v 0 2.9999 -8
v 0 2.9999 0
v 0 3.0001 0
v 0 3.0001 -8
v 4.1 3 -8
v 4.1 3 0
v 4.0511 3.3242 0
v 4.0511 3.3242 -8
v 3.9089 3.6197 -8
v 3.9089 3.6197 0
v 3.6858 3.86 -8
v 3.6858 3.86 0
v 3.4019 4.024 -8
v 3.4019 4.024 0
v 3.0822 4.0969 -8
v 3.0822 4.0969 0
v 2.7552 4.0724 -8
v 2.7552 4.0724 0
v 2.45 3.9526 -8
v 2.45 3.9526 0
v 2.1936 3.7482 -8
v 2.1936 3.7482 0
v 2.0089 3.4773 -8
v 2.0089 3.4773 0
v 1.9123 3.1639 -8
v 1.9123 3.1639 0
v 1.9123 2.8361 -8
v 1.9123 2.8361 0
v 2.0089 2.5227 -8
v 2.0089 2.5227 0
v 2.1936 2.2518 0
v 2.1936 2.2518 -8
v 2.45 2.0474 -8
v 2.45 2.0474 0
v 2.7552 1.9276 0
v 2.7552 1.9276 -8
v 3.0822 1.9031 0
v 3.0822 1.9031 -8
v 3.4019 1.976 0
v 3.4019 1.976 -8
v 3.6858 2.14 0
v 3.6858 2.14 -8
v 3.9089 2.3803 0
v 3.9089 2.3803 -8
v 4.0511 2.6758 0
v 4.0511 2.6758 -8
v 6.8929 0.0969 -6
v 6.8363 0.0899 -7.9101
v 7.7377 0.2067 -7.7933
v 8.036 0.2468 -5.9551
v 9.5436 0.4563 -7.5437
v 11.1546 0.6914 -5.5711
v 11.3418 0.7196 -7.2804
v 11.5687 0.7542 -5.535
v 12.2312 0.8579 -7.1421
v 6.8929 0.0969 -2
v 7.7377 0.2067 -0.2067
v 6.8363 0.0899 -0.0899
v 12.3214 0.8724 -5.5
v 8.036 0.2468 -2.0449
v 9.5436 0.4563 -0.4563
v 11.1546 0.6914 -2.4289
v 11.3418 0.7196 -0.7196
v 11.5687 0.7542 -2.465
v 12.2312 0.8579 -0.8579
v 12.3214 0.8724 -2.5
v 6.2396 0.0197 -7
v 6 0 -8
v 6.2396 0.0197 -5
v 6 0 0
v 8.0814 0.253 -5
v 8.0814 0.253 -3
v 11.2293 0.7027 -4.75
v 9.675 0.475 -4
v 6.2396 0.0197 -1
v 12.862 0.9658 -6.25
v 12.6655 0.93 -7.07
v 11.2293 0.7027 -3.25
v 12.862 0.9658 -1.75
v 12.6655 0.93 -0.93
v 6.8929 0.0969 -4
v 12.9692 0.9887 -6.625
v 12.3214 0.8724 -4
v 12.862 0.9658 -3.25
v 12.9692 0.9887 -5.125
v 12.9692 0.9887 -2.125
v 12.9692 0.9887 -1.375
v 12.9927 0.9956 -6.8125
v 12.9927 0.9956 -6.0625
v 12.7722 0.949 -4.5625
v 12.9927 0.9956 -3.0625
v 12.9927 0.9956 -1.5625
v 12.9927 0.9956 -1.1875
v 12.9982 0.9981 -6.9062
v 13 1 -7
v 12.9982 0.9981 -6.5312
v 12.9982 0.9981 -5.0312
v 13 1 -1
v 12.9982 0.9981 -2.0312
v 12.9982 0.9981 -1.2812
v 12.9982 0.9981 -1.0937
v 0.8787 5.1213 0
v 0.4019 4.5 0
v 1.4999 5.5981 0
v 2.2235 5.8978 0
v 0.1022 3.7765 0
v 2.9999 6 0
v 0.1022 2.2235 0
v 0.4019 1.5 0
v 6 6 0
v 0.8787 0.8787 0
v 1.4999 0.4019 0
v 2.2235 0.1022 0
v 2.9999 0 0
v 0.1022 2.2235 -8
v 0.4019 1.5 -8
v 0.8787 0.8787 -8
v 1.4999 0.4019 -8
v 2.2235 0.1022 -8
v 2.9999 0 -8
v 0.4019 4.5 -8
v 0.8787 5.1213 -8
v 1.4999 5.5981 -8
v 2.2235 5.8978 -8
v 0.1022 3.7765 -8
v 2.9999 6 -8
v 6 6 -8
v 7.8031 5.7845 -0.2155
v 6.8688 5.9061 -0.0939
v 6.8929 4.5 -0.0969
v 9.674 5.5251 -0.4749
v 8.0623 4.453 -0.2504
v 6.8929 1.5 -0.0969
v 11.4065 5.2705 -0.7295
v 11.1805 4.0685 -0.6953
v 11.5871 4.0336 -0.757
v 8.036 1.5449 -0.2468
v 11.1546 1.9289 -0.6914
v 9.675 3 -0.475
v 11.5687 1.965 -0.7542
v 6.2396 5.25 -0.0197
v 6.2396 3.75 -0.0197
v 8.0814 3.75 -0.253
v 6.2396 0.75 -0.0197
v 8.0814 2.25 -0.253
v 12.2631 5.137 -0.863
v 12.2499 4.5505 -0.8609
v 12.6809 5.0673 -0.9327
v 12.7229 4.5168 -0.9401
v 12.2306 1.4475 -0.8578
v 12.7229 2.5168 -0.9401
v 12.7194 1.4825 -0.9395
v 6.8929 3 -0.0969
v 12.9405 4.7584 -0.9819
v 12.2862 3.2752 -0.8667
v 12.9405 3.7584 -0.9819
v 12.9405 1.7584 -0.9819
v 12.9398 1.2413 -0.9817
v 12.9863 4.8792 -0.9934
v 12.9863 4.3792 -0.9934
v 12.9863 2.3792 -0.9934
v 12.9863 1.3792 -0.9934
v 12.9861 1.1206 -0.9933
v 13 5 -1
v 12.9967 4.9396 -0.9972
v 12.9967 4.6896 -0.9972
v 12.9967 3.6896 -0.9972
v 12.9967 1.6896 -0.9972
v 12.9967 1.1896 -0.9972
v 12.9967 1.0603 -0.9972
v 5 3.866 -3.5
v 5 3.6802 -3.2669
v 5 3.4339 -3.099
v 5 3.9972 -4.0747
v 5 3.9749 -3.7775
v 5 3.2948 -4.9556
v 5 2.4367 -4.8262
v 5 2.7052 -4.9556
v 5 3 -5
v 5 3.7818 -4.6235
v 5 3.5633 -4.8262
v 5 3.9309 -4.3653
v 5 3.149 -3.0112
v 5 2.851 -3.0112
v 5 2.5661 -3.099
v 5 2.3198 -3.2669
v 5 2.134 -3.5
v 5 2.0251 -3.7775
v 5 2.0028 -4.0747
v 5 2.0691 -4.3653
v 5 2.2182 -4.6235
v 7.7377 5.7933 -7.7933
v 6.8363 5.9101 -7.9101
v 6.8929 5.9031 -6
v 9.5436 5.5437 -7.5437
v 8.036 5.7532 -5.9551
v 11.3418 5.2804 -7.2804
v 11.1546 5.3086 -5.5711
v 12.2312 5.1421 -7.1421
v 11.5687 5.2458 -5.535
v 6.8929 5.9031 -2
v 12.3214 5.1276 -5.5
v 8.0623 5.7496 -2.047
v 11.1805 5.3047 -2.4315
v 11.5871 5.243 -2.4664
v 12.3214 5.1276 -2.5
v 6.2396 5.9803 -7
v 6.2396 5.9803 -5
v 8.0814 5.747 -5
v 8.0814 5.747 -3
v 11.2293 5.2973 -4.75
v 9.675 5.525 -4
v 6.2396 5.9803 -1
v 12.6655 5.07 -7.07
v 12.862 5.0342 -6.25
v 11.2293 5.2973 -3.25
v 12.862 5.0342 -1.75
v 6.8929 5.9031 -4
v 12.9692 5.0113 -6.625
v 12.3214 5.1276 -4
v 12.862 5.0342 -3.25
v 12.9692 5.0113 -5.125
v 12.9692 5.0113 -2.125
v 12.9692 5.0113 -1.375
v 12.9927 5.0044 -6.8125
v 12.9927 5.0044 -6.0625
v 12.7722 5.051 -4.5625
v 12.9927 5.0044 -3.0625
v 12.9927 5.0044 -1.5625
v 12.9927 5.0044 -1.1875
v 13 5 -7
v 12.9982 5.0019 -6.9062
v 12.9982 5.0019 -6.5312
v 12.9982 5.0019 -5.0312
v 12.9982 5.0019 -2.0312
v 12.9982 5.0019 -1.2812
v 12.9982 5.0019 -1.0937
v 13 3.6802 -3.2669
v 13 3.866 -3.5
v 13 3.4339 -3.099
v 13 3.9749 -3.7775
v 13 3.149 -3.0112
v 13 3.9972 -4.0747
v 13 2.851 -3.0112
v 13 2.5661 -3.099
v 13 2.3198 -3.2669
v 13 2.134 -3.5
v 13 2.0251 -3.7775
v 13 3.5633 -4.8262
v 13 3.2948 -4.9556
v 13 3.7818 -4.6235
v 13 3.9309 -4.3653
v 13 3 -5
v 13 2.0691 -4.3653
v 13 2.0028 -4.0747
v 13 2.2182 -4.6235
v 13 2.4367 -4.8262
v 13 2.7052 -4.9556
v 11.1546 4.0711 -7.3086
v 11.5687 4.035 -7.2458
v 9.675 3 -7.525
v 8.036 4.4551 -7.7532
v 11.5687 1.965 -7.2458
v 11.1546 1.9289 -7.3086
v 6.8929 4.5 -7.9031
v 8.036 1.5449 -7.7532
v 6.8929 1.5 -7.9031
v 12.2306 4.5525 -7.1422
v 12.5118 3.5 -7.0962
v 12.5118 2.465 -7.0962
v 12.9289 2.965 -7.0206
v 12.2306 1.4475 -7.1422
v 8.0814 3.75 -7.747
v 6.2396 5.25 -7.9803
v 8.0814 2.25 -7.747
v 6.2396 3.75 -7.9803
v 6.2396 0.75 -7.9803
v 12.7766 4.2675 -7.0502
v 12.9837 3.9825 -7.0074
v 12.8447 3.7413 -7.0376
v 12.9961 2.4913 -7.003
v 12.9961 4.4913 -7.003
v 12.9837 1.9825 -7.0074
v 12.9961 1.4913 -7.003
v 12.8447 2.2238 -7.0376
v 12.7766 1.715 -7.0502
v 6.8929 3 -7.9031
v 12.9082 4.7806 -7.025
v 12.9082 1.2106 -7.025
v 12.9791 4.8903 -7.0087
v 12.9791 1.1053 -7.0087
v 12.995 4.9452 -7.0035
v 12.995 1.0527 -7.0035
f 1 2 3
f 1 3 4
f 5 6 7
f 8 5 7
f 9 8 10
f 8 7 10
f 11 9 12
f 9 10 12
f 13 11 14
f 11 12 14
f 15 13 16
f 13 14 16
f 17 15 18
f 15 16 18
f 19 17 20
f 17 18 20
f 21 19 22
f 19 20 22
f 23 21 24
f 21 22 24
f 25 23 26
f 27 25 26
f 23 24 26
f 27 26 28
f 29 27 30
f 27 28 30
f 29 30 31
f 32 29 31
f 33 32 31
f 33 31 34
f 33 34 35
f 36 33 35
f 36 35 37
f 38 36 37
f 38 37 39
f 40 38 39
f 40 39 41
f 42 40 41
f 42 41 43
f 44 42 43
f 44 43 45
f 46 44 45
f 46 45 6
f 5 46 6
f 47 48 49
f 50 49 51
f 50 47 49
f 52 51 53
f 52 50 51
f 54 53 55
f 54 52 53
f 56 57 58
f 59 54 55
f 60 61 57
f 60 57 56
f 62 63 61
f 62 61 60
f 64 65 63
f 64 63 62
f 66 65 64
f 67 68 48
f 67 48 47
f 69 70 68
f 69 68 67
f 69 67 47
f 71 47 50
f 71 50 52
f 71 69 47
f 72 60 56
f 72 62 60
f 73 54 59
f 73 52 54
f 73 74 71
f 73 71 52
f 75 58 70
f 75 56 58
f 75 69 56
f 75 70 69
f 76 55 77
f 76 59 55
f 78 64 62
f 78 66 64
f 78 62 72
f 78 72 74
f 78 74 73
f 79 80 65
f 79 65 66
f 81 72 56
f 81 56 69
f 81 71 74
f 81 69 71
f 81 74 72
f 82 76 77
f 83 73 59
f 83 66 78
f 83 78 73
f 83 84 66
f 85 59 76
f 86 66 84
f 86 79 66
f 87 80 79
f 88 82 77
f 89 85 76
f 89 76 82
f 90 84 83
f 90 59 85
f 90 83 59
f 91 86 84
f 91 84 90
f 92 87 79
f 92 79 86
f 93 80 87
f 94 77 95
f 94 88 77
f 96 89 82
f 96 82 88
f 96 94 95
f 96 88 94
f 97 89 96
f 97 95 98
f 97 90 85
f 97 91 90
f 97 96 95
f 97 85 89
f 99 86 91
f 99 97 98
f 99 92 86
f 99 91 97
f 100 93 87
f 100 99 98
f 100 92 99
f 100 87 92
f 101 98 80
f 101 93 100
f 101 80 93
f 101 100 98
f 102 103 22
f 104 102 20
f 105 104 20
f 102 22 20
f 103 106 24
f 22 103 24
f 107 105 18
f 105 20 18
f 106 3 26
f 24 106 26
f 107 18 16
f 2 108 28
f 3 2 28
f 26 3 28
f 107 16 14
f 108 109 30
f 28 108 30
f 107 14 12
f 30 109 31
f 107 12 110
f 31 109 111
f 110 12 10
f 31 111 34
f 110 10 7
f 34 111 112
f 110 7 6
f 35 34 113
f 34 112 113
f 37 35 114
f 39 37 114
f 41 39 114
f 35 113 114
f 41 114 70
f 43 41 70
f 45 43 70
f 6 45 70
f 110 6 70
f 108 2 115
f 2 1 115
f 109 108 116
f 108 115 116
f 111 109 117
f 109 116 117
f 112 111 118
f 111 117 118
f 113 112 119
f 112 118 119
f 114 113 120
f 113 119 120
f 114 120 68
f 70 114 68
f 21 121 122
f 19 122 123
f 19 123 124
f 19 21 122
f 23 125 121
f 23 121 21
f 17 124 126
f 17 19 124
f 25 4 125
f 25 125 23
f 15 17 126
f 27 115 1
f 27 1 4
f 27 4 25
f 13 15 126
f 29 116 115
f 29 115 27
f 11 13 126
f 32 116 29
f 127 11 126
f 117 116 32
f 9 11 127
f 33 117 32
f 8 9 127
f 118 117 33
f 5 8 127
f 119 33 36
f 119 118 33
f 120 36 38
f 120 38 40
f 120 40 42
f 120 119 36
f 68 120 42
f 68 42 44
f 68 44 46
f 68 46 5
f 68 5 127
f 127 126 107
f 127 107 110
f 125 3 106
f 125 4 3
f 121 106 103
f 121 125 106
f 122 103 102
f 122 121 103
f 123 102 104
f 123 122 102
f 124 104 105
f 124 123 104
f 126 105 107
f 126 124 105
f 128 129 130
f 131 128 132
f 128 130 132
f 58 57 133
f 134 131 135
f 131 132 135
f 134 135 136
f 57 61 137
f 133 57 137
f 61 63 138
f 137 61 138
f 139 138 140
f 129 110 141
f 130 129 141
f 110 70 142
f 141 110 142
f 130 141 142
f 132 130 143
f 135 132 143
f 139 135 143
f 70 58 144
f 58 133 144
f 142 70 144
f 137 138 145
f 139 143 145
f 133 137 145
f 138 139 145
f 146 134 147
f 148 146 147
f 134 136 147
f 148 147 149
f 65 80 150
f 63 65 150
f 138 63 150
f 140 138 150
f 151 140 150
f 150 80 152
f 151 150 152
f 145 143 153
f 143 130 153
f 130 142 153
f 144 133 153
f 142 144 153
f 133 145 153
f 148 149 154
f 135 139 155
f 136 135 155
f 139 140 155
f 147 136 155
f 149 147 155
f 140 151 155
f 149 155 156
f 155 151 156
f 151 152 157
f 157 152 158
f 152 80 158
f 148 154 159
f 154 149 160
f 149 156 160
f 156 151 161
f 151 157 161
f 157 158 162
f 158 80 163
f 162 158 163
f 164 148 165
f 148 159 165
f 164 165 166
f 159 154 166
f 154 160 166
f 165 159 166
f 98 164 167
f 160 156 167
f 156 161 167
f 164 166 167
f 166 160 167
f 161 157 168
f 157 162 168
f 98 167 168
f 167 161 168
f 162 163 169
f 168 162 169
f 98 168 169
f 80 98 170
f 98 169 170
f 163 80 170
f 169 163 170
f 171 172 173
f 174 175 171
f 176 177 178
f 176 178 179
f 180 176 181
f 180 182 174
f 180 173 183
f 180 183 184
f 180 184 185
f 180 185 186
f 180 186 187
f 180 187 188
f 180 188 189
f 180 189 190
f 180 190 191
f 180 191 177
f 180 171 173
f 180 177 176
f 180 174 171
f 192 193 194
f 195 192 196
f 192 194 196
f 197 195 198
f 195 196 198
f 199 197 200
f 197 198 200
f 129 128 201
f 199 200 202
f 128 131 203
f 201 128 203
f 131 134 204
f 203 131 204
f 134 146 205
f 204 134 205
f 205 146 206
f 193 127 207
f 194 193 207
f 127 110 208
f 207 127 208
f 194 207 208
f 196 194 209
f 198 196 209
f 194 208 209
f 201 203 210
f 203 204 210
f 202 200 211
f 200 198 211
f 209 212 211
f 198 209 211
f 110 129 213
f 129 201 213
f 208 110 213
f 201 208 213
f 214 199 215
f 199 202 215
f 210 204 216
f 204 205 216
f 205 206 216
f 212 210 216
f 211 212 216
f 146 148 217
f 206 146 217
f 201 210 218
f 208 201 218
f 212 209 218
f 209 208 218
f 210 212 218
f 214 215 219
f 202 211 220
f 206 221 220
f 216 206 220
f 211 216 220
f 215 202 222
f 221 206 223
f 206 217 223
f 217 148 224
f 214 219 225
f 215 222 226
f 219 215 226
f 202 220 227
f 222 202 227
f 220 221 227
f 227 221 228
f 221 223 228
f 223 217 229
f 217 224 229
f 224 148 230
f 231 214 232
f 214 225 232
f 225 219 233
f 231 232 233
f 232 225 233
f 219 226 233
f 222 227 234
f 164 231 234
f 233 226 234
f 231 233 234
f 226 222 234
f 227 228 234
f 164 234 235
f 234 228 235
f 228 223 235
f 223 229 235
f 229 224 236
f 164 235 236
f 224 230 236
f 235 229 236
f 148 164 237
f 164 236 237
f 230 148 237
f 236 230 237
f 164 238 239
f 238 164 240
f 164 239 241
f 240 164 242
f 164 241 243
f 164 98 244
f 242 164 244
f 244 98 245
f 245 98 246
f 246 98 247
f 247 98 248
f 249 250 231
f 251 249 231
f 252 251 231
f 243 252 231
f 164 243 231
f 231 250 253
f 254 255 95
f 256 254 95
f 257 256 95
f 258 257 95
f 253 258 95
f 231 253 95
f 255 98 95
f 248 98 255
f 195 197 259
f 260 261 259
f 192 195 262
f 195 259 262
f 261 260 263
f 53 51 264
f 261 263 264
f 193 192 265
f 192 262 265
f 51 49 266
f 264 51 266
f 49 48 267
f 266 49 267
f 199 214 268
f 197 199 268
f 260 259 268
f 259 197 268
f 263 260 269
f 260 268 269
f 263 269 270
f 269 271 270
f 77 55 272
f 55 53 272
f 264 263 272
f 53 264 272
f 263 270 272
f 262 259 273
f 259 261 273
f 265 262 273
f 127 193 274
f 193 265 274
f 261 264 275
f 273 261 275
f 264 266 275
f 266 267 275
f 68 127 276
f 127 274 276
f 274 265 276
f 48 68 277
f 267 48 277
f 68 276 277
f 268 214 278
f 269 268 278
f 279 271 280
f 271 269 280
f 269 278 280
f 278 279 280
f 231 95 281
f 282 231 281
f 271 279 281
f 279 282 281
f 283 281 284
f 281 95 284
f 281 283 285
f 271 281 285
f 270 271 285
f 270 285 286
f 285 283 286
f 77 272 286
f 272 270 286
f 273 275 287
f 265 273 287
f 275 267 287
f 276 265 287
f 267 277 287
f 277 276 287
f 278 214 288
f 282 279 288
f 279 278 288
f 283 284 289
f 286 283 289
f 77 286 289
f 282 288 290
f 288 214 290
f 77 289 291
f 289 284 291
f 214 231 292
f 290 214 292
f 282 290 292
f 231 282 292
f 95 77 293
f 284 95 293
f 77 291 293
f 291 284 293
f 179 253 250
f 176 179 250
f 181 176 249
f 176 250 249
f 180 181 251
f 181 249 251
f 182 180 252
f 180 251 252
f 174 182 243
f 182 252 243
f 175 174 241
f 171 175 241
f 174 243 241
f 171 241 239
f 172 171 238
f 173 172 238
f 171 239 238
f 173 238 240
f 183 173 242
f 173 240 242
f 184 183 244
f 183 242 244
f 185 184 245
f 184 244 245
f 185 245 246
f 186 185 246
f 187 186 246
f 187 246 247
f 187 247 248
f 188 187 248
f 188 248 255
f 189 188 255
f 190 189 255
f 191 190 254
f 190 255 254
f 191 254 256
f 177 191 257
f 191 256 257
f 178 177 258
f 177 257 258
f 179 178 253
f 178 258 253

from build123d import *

# Parameters (mm, degrees)
SKETCH_1_W          = 13
SKETCH_1_H          = 8
EXTRUDE_1_DEPTH     = 6
SKETCH_2_R          = 1.1
CUT_EXTRUDE_1_DEPTH = 17.401219467
SKETCH_3_R          = 1
CUT_EXTRUDE_2_DEPTH = 8
FILLET_1_SIZE       = 1
FILLET_1_SIZE_2     = 7
FILLET_2_R          = 3


# Some blends are built 0.0001 mm under size
with BuildPart() as part:
    # 草图1 → 凸台-拉伸1 (new body)
    with BuildSketch(Plane(origin=(0, 0, 0), x_dir=(1, 0, 0), z_dir=(0, 1, 0))):
        with Locations((6.5, 4)):
            Rectangle(SKETCH_1_W, SKETCH_1_H)
    extrude(amount=EXTRUDE_1_DEPTH)

    # 草图2 → 切除-拉伸1 (cut, through all)
    with BuildSketch(Plane.XY):
        with Locations((3, 3)):
            Circle(SKETCH_2_R)
    extrude(amount=-CUT_EXTRUDE_1_DEPTH, mode=Mode.SUBTRACT)

    # 草图3 → 切除-拉伸2 (cut)
    with BuildSketch(Plane(origin=(13, 0, 0), x_dir=(0, 0, -1), z_dir=(1, 0, 0))):
        with Locations((4, 3)):
            Circle(SKETCH_3_R)
    extrude(amount=-CUT_EXTRUDE_2_DEPTH, mode=Mode.SUBTRACT)

    # 圆角1
    # a fillet whose section is not a circle: 7, 1 mm, written as the material it takes off along each edge
    with BuildSketch(Plane(origin=(13, -17.5, -8), x_dir=(0, 0, 1), z_dir=(0, 1, 0))) as fillet_1_piece_1:
        with BuildLine():
            Bezier((FILLET_1_SIZE, 0), (0, 0), (0, -FILLET_1_SIZE_2), weights=[1, 0.052631579, 1])
            Line((0, -FILLET_1_SIZE_2), (0, 0))
            Line((0, 0), (FILLET_1_SIZE, 0))
        make_face()
    extrude(amount=41, mode=Mode.SUBTRACT)
    with BuildSketch(Plane(origin=(13, 0, 17.5), x_dir=(-1, 0, 0), z_dir=(0, 0, -1))) as fillet_1_piece_2:
        with BuildLine():
            Bezier((FILLET_1_SIZE_2, 0), (0, 0), (0, FILLET_1_SIZE), weights=[1, 0.052631579, 1])
            Line((0, FILLET_1_SIZE), (0, 0))
            Line((0, 0), (FILLET_1_SIZE_2, 0))
        make_face()
    extrude(amount=43, mode=Mode.SUBTRACT)
    with BuildSketch(Plane(origin=(13, -17.5, 0), x_dir=(-1, 0, 0), z_dir=(0, 1, 0))) as fillet_1_piece_3:
        with BuildLine():
            Bezier((FILLET_1_SIZE_2, 0), (0, 0), (0, -FILLET_1_SIZE), weights=[1, 0.052631579, 1])
            Line((0, -FILLET_1_SIZE), (0, 0))
            Line((0, 0), (FILLET_1_SIZE_2, 0))
        make_face()
    extrude(amount=41, mode=Mode.SUBTRACT)
    with BuildSketch(Plane(origin=(13, 6, 17.5), x_dir=(-1, 0, 0), z_dir=(0, 0, -1))) as fillet_1_piece_4:
        with BuildLine():
            Bezier((FILLET_1_SIZE_2, 0), (0, 0), (0, -FILLET_1_SIZE), weights=[1, 0.052631579, 1])
            Line((0, -FILLET_1_SIZE), (0, 0))
            Line((0, 0), (FILLET_1_SIZE_2, 0))
        make_face()
    extrude(amount=43, mode=Mode.SUBTRACT)

    # 圆角2
    fillet_2_edges = [part.edges().sort_by_distance(p)[0] for p in [
        (0, 0, -4),
        (0, 6, -4),
    ]]
    fillet(fillet_2_edges, radius=FILLET_2_R - 0.0001)  # a hair under: the kernel refuses the full size


solid = part.part
